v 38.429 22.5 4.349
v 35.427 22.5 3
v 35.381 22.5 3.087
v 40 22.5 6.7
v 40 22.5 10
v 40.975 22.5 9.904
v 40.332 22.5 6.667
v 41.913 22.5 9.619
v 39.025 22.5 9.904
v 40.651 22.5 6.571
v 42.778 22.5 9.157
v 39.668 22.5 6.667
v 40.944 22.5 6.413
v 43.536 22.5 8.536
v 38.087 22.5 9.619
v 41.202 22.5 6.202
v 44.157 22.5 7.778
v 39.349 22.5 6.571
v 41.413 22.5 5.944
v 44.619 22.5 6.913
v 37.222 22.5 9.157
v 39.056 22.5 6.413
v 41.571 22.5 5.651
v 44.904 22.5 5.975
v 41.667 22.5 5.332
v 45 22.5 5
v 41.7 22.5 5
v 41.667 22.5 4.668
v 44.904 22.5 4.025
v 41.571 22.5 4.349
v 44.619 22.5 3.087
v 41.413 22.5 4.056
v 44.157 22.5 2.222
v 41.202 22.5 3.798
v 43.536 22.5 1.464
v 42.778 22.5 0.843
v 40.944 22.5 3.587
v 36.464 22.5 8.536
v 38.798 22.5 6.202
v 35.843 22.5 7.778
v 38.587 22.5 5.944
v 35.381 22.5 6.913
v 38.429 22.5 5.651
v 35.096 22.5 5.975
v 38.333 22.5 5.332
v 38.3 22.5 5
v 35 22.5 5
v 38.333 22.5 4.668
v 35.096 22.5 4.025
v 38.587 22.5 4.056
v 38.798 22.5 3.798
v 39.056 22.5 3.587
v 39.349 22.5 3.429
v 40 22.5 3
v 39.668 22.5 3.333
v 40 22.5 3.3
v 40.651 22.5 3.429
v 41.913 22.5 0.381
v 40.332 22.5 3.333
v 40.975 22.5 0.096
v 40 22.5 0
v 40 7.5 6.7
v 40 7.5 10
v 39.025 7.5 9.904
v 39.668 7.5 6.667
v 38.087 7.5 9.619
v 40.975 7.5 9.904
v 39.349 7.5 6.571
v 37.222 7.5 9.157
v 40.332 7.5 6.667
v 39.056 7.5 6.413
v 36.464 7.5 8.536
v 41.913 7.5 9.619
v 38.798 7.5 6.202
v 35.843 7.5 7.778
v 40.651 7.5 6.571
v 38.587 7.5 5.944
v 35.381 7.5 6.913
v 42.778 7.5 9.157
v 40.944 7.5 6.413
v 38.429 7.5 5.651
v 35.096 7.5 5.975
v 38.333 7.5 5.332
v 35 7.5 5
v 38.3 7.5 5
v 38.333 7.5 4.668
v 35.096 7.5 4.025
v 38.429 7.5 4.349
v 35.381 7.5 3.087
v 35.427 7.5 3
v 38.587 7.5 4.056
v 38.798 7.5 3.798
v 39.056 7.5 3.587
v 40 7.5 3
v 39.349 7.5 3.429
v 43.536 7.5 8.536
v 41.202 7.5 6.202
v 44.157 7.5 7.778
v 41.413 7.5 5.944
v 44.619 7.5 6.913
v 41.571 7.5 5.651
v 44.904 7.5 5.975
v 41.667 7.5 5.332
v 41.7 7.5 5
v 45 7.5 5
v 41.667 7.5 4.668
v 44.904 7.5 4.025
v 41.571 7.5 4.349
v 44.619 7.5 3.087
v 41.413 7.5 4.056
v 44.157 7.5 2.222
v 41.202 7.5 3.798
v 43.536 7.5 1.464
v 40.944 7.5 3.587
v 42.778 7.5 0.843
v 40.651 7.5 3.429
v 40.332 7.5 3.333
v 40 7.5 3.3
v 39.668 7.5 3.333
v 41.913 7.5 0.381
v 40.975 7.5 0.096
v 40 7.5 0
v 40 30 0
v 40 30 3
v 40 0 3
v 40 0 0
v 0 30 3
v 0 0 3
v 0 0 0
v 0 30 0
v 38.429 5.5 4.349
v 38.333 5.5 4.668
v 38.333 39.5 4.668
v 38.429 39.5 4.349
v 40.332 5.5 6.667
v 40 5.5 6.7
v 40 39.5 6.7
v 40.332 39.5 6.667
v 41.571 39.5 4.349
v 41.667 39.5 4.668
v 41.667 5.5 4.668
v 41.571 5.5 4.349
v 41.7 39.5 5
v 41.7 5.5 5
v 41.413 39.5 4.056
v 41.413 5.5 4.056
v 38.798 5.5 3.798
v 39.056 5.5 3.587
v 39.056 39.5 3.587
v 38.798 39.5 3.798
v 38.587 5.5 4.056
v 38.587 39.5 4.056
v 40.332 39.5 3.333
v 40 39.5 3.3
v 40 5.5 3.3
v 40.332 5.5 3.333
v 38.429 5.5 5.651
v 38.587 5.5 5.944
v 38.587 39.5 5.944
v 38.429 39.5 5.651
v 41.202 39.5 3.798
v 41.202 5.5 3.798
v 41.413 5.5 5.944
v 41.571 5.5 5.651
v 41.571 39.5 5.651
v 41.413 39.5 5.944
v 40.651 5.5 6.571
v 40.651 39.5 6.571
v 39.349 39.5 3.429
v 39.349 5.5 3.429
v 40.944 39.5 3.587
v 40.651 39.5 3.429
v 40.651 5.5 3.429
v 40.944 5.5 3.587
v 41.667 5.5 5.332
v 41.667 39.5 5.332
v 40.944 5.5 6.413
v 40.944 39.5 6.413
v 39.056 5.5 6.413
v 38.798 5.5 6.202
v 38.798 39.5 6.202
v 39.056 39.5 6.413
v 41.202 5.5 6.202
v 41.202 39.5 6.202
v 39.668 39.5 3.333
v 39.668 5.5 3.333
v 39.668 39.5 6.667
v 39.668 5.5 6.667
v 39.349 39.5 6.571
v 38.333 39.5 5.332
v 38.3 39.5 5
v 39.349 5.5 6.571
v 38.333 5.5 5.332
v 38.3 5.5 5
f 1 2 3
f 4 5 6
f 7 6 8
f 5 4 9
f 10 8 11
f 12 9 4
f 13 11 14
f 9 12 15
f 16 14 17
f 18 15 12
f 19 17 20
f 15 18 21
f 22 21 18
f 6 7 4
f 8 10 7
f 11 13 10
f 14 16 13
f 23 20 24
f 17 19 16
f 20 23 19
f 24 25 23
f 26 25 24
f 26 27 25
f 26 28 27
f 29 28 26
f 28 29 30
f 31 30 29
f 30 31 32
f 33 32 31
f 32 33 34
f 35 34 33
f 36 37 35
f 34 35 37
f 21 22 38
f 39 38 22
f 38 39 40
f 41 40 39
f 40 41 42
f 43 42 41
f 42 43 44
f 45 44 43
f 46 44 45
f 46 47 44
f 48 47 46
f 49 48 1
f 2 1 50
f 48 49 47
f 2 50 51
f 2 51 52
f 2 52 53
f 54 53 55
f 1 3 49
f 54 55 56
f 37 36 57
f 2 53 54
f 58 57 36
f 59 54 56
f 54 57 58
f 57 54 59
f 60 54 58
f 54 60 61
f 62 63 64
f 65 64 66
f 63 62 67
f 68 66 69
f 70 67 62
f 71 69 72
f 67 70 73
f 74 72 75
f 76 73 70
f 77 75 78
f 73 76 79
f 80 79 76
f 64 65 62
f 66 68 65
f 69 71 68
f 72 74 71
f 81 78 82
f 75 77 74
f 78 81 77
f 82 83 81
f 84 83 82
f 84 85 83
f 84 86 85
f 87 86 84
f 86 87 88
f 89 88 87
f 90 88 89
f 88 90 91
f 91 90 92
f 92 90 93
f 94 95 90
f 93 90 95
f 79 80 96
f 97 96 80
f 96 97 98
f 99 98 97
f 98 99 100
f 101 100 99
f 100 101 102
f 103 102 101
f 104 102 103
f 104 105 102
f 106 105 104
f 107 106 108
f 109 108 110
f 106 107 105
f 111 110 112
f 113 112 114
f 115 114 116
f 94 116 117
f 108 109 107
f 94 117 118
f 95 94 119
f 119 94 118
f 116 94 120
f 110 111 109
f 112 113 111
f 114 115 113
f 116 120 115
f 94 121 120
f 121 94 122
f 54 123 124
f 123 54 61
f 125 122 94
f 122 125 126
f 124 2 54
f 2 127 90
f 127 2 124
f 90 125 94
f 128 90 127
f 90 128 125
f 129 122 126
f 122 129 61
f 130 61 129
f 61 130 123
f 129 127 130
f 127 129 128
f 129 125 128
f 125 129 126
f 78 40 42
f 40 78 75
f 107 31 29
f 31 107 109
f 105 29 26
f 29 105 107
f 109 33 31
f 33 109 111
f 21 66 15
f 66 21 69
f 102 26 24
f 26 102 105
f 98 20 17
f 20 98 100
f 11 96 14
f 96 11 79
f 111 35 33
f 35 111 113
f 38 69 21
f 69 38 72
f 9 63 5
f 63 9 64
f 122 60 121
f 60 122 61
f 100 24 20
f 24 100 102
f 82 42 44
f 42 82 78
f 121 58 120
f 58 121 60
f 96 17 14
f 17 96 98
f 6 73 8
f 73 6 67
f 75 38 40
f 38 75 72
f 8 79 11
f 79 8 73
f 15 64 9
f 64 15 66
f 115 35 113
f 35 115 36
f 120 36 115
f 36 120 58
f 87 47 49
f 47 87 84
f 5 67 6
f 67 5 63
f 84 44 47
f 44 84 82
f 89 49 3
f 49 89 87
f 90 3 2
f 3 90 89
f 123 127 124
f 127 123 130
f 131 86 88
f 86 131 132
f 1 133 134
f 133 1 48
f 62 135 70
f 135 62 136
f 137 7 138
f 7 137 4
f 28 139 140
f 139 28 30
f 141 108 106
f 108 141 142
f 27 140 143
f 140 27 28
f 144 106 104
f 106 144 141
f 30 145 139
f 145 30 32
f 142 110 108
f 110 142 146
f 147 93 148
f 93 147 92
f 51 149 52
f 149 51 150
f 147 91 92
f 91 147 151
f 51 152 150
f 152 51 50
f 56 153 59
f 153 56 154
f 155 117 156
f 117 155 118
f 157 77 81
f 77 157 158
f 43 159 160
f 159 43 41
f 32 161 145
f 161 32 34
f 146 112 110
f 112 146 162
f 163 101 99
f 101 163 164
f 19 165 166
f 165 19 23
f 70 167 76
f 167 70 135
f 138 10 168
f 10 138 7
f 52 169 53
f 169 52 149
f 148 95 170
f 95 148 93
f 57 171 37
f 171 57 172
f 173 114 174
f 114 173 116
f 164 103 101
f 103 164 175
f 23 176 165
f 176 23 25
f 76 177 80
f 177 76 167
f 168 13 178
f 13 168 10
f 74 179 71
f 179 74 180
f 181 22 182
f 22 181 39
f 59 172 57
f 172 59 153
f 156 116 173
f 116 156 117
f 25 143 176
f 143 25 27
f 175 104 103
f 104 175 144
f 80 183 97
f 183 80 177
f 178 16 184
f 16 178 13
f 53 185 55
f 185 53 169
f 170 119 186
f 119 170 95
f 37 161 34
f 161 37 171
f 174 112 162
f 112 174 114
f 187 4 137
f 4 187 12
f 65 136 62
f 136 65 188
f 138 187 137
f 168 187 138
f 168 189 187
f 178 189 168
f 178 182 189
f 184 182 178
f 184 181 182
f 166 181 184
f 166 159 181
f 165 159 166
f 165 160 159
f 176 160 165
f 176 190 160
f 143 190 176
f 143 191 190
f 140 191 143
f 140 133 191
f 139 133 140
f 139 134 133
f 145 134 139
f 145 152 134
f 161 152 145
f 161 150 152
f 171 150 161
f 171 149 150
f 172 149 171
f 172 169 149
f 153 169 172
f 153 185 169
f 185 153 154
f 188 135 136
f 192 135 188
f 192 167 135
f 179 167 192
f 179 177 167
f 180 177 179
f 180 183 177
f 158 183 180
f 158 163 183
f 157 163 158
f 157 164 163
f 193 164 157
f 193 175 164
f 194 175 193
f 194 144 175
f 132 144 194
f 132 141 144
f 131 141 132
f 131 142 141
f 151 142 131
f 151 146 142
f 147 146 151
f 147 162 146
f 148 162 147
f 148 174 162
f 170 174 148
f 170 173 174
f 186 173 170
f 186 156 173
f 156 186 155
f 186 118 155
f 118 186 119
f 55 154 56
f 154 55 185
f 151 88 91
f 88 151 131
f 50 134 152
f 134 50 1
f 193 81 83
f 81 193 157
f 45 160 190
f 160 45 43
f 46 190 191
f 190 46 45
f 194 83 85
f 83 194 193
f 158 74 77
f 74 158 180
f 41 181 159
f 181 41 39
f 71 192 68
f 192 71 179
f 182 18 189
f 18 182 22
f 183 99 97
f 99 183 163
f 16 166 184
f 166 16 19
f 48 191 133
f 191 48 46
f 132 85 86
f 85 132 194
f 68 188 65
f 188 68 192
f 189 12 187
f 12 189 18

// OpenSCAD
// Simple Print-in-Place Hinge

/* [Dimensions] */
width = 30;           // [15:60]
length = 40;          // [20:80]
thickness = 3;        // [2:5]
pin_diameter = 4;     // [3:6]
clearance = 0.3;      // [0.2:0.1:0.5]

hinge_radius = pin_diameter/2 + thickness;

// Left plate
cube([length, width/2, thickness]);
translate([length, width/4, hinge_radius])
    rotate([-90, 0, 0])
        cylinder(h=width/2, r=hinge_radius, $fn=32);

// Right plate
translate([0, width/2, 0])
    cube([length, width/2, thickness]);
translate([length, width/4, hinge_radius])
    rotate([-90, 0, 0])
        difference() {
            cylinder(h=width/2, r=hinge_radius - clearance, $fn=32);
            translate([0, 0, -1])
                cylinder(h=width/2 + 2, r=pin_diameter/2, $fn=32);
        }

// Pin
translate([length, width/4 - 2, hinge_radius])
    rotate([-90, 0, 0])
        cylinder(h=width + 4, r=pin_diameter/2 - clearance, $fn=32);
